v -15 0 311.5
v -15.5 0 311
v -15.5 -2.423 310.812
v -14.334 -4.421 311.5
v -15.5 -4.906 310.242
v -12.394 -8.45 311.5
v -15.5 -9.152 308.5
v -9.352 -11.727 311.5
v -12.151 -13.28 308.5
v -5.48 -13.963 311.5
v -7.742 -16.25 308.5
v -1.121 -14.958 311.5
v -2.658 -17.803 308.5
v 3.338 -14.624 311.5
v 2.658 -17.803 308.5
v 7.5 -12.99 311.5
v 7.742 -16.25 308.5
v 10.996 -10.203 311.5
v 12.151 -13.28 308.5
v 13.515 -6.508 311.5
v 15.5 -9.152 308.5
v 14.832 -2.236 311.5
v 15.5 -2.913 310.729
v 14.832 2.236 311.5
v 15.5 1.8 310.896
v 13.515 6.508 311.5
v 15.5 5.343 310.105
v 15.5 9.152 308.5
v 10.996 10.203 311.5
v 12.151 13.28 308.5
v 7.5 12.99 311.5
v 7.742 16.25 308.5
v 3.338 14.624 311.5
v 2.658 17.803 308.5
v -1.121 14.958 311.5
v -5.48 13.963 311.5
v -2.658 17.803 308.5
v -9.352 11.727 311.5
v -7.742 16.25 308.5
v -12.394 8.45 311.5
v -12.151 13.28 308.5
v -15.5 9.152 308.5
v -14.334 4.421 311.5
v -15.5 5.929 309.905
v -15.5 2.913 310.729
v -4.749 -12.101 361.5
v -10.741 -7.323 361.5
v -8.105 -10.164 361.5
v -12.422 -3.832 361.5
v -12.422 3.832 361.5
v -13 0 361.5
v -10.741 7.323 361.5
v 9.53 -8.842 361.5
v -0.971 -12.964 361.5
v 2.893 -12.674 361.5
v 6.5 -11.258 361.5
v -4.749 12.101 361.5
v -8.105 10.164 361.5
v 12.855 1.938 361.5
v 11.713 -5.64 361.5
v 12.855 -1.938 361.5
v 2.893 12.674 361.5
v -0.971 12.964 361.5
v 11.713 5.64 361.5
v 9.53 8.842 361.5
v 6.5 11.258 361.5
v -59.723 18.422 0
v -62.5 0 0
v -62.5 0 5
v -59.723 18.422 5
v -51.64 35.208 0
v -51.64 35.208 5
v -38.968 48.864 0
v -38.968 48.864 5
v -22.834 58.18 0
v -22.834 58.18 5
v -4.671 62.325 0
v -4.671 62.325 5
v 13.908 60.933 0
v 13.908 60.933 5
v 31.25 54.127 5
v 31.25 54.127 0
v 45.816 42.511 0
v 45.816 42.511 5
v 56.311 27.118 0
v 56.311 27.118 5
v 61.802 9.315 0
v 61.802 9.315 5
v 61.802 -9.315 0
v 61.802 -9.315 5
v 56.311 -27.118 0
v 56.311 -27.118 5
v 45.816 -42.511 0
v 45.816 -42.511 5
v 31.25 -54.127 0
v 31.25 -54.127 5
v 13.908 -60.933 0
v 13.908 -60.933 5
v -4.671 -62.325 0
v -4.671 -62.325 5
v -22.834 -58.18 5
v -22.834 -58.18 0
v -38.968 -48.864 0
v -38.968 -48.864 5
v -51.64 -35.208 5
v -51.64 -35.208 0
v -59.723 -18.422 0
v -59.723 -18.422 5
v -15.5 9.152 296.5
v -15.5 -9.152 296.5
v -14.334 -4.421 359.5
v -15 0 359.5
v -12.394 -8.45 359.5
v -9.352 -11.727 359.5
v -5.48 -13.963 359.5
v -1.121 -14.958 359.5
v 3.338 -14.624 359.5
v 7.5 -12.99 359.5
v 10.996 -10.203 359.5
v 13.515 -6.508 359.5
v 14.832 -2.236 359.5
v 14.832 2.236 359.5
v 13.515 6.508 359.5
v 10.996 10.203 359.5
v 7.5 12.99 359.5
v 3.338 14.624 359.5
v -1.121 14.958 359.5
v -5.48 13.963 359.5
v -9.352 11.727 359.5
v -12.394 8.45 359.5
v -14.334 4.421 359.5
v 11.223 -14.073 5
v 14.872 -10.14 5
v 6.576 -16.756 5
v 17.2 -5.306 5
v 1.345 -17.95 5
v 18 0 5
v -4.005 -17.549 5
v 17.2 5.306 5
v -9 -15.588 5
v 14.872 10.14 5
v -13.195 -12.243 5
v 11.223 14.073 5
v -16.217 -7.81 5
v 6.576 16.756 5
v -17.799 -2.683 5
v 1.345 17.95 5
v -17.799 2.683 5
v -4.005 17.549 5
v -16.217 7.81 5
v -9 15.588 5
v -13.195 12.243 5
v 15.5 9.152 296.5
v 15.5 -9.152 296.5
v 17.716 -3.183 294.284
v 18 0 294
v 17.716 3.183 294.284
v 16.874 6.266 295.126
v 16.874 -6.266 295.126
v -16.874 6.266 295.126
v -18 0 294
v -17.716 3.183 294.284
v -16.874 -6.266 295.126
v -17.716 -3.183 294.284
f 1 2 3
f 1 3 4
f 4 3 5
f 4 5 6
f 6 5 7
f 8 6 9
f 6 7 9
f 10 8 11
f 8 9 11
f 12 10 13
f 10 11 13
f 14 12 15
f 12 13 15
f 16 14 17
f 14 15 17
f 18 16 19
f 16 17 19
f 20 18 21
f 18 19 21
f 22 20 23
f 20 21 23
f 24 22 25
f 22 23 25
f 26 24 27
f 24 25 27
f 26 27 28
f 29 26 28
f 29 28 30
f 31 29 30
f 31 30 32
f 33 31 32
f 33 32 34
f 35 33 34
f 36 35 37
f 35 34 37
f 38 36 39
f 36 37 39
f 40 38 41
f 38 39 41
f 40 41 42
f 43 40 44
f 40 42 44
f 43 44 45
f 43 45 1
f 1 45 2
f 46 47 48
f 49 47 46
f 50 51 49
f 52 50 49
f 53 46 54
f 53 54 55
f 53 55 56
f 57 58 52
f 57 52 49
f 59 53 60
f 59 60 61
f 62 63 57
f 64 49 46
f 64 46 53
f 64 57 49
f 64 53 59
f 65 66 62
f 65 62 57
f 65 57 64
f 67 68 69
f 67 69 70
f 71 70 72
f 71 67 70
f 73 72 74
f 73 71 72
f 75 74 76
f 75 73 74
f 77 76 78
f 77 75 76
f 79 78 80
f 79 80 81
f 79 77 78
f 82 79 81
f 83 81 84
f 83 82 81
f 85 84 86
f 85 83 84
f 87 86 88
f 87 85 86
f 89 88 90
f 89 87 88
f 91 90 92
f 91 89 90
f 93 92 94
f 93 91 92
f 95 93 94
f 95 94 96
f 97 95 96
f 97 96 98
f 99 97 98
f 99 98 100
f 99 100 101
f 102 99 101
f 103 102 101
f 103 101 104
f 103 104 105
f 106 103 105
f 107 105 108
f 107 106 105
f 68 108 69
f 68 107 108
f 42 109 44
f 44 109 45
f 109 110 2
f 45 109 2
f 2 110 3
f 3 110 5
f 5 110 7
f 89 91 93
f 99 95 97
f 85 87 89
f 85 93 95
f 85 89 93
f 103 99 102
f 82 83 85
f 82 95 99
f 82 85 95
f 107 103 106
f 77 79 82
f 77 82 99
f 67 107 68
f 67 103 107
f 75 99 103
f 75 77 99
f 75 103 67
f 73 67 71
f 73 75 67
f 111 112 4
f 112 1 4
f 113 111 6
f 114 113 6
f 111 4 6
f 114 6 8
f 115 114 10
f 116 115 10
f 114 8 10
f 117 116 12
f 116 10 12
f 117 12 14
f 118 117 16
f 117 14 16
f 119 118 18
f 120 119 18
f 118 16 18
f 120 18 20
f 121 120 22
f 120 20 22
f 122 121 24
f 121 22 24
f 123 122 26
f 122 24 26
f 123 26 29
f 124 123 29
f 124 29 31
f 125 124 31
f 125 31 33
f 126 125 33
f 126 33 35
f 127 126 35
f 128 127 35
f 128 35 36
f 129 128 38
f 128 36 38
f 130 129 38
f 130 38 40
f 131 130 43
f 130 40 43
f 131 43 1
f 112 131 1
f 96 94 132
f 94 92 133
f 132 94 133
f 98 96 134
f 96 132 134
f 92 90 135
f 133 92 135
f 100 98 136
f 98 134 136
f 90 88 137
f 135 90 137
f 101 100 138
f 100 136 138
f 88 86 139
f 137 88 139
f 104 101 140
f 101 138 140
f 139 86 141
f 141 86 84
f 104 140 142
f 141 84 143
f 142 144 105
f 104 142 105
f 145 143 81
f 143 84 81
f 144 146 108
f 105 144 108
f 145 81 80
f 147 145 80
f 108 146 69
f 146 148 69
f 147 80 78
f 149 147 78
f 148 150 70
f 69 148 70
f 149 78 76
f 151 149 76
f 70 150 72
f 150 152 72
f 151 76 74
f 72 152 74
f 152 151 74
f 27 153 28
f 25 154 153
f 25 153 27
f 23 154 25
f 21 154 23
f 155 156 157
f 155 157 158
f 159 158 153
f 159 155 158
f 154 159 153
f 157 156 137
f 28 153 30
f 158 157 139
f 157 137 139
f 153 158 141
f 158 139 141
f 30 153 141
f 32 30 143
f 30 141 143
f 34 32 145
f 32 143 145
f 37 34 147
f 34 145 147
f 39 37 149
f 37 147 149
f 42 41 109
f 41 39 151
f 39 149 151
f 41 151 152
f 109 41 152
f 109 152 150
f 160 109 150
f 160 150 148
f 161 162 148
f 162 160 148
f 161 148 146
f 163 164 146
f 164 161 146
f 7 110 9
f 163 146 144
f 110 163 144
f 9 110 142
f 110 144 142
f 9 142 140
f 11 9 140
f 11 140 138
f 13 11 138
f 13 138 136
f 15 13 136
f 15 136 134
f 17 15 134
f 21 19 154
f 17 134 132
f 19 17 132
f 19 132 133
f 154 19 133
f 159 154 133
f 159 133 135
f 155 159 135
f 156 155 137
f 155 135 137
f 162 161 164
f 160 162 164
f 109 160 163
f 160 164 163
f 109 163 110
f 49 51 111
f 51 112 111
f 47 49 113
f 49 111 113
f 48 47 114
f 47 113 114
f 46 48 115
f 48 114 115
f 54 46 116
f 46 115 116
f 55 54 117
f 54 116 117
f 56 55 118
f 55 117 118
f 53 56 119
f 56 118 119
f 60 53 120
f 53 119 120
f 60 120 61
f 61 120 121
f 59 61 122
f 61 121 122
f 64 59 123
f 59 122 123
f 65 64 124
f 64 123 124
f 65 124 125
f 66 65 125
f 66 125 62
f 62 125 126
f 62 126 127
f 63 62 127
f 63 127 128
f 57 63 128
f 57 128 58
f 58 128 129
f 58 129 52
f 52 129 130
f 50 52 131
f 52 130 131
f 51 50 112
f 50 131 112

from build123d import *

# Parameters (mm, degrees)
SKETCH1_R          = 18
BASE_EXTRUDE_DEPTH = 361.5
SKETCH2_R          = 62.5
PISTON_DEPTH       = 5
FLATS_DEPTH        = 373.148827756
FLATS_DEPTH_BACK   = 373.148827756


with BuildPart() as part:
    # Sketch1 → Base-Extrude (new body)
    with BuildSketch(Plane.XY):
        Circle(SKETCH1_R)
    extrude(amount=BASE_EXTRUDE_DEPTH)

    # Sketch2 → Piston (add)
    with BuildSketch(Plane(origin=(0, 0, 0), x_dir=(-1, 0, 0), z_dir=(0, 0, -1))):
        Circle(SKETCH2_R)
    extrude(amount=-PISTON_DEPTH)

    # Sketch3 → Thread (revolve, cut)
    with BuildSketch(Plane(origin=(0, 0, 0), x_dir=(0, 0, -1), z_dir=(1, 0, 0)), mode=Mode.PRIVATE) as thread_sk:
        Polygon((-361.5, 18), (-361.5, 13), (-359.5, 15), (-311.5, 15), (-308.5, 18), align=None)
    revolve(thread_sk.sketch.rotate(Axis((0, 0, 0), (0, 0, 1)), 90), axis=Axis((0, 0, 0), (0, 0, 1)), mode=Mode.SUBTRACT)

    # Sketch4 → Flats (cut, two sides: drawn at the far end of the back side and taken through both)
    with BuildSketch(Plane(origin=(0, 0, 0), x_dir=(1, 0, 0), z_dir=(0, 1, 0)).offset(-FLATS_DEPTH_BACK)):
        Polygon((18, -294), (15.5, -296.5), (15.5, -361.5), (18, -361.5), align=None)
        Polygon((-18, -361.5), (-18, -294), (-15.5, -296.5), (-15.5, -361.5), align=None)
    extrude(amount=FLATS_DEPTH + FLATS_DEPTH_BACK, mode=Mode.SUBTRACT)


solid = part.part
